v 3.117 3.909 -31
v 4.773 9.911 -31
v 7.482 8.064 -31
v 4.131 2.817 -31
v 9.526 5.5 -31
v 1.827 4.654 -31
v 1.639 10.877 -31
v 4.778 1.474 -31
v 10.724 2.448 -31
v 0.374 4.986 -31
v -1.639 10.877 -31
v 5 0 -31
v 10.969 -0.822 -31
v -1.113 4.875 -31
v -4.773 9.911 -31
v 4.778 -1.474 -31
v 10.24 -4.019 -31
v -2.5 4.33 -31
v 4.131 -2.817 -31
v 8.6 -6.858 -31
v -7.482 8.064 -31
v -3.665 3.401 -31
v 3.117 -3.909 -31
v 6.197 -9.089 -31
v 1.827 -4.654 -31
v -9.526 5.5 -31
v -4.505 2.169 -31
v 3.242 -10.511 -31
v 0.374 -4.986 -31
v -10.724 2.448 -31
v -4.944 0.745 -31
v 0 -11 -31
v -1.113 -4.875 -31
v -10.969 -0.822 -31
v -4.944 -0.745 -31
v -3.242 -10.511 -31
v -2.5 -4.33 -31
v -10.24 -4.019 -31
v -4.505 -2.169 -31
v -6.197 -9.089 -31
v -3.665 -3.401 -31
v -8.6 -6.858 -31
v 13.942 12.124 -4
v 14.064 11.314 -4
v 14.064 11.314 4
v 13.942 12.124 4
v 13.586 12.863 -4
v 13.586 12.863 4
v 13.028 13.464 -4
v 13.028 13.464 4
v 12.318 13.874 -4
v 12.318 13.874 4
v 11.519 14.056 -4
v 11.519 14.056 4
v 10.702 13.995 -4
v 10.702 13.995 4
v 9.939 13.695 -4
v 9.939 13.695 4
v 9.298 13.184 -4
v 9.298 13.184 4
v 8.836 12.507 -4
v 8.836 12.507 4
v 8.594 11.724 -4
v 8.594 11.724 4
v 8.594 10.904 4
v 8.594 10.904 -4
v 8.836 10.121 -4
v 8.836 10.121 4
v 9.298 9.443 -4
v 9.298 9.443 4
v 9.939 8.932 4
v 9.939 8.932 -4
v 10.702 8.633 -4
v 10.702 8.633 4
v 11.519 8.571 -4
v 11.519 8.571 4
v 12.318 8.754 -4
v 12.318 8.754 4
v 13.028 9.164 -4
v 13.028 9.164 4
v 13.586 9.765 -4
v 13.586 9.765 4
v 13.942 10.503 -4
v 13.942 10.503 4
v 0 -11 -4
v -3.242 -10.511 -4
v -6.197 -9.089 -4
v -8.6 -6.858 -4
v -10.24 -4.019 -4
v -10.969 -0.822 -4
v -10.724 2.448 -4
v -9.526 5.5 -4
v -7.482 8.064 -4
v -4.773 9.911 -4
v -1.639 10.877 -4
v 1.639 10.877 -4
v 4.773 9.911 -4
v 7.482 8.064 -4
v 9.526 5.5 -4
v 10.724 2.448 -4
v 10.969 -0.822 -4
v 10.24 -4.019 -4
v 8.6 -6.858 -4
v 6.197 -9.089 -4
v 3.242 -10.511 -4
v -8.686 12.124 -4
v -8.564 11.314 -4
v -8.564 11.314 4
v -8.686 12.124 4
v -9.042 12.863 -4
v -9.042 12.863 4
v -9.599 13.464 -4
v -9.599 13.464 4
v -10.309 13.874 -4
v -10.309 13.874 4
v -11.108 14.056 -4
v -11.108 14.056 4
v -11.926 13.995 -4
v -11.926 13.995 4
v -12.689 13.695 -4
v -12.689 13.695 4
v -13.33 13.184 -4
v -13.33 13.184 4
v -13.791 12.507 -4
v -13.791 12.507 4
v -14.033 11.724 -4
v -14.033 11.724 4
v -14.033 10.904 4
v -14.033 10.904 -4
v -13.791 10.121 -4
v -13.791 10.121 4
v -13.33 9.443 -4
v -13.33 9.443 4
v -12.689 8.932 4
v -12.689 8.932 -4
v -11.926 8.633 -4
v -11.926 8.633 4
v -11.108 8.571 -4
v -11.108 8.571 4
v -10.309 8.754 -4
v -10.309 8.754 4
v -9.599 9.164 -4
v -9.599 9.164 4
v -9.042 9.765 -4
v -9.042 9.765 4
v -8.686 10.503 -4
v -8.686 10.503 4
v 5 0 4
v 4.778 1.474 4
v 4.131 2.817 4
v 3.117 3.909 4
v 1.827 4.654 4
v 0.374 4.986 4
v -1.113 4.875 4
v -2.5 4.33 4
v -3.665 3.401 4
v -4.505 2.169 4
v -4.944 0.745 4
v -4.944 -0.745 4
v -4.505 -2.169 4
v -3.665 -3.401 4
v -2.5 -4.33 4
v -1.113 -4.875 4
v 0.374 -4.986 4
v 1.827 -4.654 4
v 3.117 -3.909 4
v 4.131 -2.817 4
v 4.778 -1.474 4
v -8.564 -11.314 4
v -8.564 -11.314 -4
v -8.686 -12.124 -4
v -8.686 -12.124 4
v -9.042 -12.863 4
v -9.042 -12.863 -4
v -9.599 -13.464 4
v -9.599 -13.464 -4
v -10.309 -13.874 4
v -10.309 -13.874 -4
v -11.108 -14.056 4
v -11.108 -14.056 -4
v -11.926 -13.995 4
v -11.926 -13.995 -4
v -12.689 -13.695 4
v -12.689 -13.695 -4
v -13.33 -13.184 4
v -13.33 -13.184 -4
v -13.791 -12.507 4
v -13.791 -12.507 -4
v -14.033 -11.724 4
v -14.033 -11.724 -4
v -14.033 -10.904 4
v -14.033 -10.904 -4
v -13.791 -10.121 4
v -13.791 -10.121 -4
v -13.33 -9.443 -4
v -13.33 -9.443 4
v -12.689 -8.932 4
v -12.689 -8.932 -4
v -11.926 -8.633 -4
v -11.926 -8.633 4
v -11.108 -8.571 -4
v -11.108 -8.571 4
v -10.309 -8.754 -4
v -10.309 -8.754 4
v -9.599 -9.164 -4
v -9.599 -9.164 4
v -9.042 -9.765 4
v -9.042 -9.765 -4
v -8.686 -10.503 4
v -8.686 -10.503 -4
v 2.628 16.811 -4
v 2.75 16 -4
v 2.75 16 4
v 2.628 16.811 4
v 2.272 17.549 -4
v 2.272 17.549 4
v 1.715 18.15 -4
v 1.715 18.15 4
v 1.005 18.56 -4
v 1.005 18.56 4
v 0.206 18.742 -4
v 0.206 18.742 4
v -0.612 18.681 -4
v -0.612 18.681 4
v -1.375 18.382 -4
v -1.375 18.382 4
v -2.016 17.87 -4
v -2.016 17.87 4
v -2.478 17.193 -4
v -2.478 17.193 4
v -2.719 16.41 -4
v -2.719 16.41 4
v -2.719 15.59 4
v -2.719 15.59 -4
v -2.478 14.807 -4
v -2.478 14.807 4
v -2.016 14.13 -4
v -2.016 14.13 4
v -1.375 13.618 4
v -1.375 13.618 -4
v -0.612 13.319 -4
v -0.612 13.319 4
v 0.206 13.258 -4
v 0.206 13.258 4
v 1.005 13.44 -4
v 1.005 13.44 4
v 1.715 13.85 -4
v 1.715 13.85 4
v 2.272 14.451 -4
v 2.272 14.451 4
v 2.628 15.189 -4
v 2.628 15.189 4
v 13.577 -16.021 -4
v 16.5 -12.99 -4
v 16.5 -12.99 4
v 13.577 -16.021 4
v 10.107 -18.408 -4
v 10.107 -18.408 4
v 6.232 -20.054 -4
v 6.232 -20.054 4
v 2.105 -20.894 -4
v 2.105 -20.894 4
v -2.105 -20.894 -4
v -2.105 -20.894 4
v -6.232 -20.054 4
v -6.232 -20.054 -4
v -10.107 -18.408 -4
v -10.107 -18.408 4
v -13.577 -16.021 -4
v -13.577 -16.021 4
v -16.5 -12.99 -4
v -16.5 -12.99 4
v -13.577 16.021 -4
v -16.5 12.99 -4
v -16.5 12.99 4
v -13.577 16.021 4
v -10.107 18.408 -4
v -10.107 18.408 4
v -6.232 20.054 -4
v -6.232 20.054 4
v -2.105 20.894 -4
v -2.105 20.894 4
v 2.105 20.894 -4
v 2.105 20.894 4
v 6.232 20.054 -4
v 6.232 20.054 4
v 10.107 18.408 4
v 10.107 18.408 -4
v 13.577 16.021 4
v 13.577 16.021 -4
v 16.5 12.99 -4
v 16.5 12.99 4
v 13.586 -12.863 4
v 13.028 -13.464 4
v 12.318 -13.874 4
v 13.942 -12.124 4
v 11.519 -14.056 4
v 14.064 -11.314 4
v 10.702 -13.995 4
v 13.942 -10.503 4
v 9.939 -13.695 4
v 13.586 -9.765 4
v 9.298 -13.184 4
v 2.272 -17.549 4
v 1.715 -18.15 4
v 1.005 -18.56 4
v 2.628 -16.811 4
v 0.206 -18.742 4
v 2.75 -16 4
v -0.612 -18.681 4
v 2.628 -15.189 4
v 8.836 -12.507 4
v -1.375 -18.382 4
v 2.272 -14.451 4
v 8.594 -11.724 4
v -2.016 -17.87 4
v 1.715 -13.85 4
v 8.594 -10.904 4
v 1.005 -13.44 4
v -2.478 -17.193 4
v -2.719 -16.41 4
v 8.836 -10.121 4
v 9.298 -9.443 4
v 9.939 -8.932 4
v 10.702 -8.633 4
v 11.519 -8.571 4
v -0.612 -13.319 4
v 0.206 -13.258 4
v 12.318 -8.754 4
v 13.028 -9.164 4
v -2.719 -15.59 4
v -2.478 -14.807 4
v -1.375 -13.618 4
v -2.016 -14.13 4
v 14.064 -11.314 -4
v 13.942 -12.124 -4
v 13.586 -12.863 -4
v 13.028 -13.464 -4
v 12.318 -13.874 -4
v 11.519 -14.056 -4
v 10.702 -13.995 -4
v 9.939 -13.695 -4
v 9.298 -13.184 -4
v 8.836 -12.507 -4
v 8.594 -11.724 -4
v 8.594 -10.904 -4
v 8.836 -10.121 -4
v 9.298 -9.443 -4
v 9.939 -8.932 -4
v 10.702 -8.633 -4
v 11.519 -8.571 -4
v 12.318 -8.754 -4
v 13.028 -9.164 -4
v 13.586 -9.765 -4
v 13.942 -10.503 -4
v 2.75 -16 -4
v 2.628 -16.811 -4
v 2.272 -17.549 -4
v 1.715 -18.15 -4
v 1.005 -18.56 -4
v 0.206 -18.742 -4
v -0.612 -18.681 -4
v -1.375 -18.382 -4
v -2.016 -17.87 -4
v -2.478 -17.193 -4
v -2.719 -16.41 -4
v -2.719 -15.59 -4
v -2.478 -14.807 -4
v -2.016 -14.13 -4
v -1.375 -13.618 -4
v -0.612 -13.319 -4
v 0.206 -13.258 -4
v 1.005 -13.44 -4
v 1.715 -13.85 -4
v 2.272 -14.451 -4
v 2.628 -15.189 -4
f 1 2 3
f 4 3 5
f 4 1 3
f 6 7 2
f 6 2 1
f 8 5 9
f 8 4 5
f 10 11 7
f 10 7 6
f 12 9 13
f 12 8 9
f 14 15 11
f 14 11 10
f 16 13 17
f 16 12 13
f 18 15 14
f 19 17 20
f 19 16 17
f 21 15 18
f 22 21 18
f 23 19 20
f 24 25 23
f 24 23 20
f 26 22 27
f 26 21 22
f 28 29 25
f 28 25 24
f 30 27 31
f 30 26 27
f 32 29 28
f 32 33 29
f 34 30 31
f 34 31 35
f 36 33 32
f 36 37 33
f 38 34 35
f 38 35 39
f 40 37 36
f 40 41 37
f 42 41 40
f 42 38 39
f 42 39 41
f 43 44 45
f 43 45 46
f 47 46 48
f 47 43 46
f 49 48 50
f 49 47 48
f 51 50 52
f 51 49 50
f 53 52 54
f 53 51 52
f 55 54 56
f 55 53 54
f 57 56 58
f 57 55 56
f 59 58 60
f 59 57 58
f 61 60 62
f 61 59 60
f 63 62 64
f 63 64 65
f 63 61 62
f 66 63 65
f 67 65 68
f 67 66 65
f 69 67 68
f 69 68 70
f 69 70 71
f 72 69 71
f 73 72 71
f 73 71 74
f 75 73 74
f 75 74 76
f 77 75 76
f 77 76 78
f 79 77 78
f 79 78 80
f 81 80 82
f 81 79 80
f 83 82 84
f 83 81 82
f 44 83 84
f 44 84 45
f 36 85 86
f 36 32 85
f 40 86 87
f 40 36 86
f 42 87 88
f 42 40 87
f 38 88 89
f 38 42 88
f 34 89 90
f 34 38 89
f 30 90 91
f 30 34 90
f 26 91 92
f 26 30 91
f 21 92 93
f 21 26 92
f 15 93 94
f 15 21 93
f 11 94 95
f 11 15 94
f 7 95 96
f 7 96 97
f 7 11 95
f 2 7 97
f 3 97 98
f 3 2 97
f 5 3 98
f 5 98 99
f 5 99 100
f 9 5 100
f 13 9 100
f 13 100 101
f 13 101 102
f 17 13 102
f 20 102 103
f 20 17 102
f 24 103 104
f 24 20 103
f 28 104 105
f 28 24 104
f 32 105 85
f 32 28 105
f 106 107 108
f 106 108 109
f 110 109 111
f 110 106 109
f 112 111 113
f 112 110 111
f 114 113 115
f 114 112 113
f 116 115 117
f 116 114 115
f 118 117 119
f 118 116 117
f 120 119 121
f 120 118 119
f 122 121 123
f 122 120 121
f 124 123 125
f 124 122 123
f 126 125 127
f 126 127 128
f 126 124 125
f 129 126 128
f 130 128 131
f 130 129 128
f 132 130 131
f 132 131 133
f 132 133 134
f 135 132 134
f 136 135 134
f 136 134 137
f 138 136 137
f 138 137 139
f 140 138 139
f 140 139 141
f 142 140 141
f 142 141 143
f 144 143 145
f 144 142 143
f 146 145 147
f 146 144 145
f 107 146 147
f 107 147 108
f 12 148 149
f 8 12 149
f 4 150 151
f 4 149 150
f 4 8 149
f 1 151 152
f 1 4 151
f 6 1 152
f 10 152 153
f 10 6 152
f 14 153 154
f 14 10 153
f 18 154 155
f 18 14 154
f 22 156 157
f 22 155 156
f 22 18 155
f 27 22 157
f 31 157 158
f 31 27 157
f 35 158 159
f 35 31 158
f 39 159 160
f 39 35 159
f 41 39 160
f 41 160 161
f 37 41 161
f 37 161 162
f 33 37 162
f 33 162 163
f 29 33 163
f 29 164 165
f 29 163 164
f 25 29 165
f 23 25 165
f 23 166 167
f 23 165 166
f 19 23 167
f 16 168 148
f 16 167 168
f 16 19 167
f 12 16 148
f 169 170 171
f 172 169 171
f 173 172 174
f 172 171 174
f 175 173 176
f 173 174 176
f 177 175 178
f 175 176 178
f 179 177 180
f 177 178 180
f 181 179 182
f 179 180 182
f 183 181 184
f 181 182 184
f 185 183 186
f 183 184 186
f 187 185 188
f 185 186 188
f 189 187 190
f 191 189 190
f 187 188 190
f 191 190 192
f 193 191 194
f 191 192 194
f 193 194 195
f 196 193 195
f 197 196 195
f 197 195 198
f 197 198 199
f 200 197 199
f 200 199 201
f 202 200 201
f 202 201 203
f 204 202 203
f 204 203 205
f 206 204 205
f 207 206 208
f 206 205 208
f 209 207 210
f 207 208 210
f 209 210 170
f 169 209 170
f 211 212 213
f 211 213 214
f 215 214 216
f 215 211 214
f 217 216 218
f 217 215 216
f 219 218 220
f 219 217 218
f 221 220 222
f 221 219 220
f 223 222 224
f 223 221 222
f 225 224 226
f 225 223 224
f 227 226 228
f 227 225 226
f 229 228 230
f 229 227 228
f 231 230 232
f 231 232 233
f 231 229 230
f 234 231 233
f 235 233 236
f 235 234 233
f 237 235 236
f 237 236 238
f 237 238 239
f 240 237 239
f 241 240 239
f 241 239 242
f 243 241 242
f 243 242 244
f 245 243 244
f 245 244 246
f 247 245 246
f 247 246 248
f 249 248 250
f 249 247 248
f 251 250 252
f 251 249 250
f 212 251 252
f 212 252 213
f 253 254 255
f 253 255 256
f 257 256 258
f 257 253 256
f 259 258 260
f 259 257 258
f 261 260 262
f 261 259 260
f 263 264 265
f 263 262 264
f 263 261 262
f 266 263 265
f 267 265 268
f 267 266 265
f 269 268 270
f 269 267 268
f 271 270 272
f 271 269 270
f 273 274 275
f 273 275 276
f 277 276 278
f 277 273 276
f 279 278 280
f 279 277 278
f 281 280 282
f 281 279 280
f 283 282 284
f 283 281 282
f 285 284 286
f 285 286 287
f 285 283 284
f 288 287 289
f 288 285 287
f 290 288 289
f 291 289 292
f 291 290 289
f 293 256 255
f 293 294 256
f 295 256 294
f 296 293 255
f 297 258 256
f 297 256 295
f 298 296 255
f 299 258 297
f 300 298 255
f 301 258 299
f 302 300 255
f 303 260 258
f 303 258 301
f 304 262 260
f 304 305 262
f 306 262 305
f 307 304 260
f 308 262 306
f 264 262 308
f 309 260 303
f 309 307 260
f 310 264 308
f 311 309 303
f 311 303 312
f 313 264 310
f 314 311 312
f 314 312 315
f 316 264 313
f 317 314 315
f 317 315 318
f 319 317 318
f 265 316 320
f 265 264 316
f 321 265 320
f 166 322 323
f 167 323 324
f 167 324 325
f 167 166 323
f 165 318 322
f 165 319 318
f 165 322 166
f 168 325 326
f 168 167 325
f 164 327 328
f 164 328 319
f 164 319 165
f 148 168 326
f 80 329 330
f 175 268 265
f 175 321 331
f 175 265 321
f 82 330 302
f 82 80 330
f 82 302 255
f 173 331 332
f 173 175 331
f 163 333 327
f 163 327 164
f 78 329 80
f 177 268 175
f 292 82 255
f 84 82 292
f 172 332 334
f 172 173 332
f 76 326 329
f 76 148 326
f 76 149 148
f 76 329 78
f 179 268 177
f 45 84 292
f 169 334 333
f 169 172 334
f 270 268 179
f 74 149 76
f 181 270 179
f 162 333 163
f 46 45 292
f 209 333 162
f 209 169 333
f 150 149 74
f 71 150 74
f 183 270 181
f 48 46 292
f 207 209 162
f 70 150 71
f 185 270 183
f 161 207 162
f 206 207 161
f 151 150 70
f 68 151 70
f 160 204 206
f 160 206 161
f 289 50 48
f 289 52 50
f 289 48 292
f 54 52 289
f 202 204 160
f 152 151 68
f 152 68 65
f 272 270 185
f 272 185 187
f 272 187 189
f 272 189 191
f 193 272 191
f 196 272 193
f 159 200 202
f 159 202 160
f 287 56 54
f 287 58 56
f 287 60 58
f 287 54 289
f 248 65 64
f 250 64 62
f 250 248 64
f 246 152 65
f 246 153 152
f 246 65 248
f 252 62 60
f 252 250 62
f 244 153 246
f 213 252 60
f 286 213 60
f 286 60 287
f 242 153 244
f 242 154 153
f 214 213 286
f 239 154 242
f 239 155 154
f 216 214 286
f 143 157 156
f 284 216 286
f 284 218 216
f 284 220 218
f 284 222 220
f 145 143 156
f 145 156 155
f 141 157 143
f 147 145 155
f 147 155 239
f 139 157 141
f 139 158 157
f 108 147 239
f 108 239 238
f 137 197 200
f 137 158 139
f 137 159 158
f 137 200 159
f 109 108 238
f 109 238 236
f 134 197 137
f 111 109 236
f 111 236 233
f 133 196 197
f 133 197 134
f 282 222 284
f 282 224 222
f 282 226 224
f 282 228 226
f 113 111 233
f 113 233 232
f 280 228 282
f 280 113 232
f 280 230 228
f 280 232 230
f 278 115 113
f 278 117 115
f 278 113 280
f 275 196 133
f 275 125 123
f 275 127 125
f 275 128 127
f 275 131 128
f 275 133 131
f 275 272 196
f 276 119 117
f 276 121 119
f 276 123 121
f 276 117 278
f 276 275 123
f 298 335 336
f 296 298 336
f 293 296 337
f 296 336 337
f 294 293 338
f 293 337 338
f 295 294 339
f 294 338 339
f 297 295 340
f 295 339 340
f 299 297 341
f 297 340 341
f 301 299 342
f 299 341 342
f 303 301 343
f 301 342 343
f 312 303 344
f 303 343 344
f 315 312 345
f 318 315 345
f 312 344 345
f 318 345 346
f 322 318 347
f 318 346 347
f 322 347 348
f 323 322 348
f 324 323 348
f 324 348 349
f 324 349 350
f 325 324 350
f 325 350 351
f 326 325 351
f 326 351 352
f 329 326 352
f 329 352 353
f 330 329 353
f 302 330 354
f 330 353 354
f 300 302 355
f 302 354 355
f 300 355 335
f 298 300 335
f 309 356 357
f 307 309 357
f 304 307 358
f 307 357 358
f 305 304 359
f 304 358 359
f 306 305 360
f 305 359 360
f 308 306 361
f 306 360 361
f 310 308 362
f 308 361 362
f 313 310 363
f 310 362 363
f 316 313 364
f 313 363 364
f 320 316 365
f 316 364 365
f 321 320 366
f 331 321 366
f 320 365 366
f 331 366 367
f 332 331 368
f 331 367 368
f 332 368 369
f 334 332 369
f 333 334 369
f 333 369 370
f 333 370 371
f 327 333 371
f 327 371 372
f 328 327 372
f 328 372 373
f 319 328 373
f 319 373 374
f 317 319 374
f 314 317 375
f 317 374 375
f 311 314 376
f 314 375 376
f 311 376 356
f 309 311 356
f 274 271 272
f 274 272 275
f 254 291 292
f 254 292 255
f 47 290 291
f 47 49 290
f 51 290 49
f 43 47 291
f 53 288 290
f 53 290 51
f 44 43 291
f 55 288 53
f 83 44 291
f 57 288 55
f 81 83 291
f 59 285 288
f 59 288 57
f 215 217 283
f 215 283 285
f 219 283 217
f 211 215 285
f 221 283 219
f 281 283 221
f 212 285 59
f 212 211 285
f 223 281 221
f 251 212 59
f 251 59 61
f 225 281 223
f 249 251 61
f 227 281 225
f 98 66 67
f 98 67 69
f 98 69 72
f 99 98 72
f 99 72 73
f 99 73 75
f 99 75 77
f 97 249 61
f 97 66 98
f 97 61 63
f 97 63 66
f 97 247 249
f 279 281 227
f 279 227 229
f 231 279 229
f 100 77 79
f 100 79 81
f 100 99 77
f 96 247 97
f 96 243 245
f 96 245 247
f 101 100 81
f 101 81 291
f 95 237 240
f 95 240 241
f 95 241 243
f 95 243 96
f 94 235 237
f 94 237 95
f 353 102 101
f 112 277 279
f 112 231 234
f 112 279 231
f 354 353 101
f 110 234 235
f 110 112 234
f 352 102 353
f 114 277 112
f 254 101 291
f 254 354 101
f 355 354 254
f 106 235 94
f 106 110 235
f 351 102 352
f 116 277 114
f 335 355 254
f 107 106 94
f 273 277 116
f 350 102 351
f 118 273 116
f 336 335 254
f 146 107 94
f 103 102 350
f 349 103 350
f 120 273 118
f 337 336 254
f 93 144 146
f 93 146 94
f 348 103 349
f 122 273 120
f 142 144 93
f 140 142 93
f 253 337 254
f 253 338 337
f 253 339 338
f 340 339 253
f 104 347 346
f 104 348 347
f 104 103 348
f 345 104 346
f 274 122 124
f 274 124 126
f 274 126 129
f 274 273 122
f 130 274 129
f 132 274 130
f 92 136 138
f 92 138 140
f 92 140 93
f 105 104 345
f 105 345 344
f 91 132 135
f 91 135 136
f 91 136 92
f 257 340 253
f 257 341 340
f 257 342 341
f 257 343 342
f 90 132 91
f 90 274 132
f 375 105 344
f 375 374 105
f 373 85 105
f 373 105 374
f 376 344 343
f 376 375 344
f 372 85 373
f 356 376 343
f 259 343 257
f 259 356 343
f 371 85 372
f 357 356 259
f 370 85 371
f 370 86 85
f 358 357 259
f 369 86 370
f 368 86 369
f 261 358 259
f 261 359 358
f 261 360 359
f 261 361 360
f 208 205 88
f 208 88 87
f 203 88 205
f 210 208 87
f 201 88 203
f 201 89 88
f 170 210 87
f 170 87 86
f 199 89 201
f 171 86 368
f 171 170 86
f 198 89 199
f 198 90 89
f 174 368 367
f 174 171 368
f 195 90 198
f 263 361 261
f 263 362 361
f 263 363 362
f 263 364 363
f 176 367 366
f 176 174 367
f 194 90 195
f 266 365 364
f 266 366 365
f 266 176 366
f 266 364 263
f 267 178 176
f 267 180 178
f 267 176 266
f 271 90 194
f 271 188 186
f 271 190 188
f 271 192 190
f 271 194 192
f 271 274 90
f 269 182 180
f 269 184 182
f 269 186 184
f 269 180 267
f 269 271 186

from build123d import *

# Parameters (mm, degrees)
CUT_EXTRUDE_START        = -4
CUT_EXTRUDE_7_DEPTH      = 8
SKETCH_5_R               = 2.75
CUT_EXTRUDE_2_DEPTH      = 8
SKETCH_6_R               = 2.75
CUT_EXTRUDE_3_DEPTH      = 8
CUT_EXTRUDE_5_DEPTH      = 41.917600125
CUT_EXTRUDE_5_DEPTH_BACK = 41.917600125
SKETCH_8_R               = 5
EXTRUDE_START            = -75
SKETCH_10_R              = 5
EXTRUDE_1_DEPTH          = 150


with BuildPart() as part:
    # 草图3 → 旋转1 (revolve)
    with BuildSketch(Plane(origin=(0, 0, 0), x_dir=(0, 0, -1), z_dir=(1, 0, 0)), mode=Mode.PRIVATE) as revolve_1_sk:
        Polygon((-4, 0), (-4, 21), (4, 21), (4, 11), (31, 11), (31, 0), align=None)
    revolve(revolve_1_sk.sketch.rotate(Axis((0, 0, 4), (0, 0, -1)), 180), axis=Axis((0, 0, 4), (0, 0, -1)))

    # 草图13 → 切除-拉伸7 (cut)
    with BuildSketch(Plane.XY.offset(CUT_EXTRUDE_START)):
        with BuildLine():
            Line((-16.5, -12.990381057), (-16.5, 12.990381057))
            ThreePointArc((-16.5, 12.990381057), (-21, 0), (-16.5, -12.990381057))
        make_face()
        with BuildLine():
            Line((16.5, 12.990381057), (16.5, -12.990381057))
            ThreePointArc((16.5, -12.990381057), (21, 0), (16.5, 12.990381057))
        make_face()
    extrude(amount=CUT_EXTRUDE_7_DEPTH, mode=Mode.SUBTRACT)

    # 草图5 → 切除-拉伸2 (cut)
    with BuildSketch(Plane.XY.offset(CUT_EXTRUDE_START)):
        with Locations((-11.313708499, 11.313708499)):
            Circle(SKETCH_5_R)
        with Locations((11.313708499, 11.313708499)):
            Circle(SKETCH_5_R)
    cut_extrude_2 = extrude(amount=CUT_EXTRUDE_2_DEPTH, mode=Mode.SUBTRACT)

    # 镜向1: 切除-拉伸2 across plane
    add(cut_extrude_2.mirror(Plane.ZX), mode=Mode.SUBTRACT)

    # 草图6 → 切除-拉伸3 (cut)
    with BuildSketch(Plane.XY.offset(CUT_EXTRUDE_START)):
        with Locations((0, 16)):
            Circle(SKETCH_6_R)
    cut_extrude_3 = extrude(amount=CUT_EXTRUDE_3_DEPTH, mode=Mode.SUBTRACT)

    # 镜向2: 切除-拉伸3 across plane
    add(cut_extrude_3.mirror(Plane.ZX), mode=Mode.SUBTRACT)

    # 草图8 → 切除-拉伸5 (cut, two sides: drawn at the far end of the back side and taken through both)
    with BuildSketch(Plane.XY.offset(-CUT_EXTRUDE_5_DEPTH_BACK)):
        Circle(SKETCH_8_R)
    extrude(amount=CUT_EXTRUDE_5_DEPTH + CUT_EXTRUDE_5_DEPTH_BACK, mode=Mode.SUBTRACT)


with BuildPart() as body_2:
    # 草图10 → 凸台-拉伸1 (new body)
    with BuildSketch(Plane.XY.offset(EXTRUDE_START)):
        Circle(SKETCH_10_R)
    extrude(amount=EXTRUDE_1_DEPTH)


solid = part.part
